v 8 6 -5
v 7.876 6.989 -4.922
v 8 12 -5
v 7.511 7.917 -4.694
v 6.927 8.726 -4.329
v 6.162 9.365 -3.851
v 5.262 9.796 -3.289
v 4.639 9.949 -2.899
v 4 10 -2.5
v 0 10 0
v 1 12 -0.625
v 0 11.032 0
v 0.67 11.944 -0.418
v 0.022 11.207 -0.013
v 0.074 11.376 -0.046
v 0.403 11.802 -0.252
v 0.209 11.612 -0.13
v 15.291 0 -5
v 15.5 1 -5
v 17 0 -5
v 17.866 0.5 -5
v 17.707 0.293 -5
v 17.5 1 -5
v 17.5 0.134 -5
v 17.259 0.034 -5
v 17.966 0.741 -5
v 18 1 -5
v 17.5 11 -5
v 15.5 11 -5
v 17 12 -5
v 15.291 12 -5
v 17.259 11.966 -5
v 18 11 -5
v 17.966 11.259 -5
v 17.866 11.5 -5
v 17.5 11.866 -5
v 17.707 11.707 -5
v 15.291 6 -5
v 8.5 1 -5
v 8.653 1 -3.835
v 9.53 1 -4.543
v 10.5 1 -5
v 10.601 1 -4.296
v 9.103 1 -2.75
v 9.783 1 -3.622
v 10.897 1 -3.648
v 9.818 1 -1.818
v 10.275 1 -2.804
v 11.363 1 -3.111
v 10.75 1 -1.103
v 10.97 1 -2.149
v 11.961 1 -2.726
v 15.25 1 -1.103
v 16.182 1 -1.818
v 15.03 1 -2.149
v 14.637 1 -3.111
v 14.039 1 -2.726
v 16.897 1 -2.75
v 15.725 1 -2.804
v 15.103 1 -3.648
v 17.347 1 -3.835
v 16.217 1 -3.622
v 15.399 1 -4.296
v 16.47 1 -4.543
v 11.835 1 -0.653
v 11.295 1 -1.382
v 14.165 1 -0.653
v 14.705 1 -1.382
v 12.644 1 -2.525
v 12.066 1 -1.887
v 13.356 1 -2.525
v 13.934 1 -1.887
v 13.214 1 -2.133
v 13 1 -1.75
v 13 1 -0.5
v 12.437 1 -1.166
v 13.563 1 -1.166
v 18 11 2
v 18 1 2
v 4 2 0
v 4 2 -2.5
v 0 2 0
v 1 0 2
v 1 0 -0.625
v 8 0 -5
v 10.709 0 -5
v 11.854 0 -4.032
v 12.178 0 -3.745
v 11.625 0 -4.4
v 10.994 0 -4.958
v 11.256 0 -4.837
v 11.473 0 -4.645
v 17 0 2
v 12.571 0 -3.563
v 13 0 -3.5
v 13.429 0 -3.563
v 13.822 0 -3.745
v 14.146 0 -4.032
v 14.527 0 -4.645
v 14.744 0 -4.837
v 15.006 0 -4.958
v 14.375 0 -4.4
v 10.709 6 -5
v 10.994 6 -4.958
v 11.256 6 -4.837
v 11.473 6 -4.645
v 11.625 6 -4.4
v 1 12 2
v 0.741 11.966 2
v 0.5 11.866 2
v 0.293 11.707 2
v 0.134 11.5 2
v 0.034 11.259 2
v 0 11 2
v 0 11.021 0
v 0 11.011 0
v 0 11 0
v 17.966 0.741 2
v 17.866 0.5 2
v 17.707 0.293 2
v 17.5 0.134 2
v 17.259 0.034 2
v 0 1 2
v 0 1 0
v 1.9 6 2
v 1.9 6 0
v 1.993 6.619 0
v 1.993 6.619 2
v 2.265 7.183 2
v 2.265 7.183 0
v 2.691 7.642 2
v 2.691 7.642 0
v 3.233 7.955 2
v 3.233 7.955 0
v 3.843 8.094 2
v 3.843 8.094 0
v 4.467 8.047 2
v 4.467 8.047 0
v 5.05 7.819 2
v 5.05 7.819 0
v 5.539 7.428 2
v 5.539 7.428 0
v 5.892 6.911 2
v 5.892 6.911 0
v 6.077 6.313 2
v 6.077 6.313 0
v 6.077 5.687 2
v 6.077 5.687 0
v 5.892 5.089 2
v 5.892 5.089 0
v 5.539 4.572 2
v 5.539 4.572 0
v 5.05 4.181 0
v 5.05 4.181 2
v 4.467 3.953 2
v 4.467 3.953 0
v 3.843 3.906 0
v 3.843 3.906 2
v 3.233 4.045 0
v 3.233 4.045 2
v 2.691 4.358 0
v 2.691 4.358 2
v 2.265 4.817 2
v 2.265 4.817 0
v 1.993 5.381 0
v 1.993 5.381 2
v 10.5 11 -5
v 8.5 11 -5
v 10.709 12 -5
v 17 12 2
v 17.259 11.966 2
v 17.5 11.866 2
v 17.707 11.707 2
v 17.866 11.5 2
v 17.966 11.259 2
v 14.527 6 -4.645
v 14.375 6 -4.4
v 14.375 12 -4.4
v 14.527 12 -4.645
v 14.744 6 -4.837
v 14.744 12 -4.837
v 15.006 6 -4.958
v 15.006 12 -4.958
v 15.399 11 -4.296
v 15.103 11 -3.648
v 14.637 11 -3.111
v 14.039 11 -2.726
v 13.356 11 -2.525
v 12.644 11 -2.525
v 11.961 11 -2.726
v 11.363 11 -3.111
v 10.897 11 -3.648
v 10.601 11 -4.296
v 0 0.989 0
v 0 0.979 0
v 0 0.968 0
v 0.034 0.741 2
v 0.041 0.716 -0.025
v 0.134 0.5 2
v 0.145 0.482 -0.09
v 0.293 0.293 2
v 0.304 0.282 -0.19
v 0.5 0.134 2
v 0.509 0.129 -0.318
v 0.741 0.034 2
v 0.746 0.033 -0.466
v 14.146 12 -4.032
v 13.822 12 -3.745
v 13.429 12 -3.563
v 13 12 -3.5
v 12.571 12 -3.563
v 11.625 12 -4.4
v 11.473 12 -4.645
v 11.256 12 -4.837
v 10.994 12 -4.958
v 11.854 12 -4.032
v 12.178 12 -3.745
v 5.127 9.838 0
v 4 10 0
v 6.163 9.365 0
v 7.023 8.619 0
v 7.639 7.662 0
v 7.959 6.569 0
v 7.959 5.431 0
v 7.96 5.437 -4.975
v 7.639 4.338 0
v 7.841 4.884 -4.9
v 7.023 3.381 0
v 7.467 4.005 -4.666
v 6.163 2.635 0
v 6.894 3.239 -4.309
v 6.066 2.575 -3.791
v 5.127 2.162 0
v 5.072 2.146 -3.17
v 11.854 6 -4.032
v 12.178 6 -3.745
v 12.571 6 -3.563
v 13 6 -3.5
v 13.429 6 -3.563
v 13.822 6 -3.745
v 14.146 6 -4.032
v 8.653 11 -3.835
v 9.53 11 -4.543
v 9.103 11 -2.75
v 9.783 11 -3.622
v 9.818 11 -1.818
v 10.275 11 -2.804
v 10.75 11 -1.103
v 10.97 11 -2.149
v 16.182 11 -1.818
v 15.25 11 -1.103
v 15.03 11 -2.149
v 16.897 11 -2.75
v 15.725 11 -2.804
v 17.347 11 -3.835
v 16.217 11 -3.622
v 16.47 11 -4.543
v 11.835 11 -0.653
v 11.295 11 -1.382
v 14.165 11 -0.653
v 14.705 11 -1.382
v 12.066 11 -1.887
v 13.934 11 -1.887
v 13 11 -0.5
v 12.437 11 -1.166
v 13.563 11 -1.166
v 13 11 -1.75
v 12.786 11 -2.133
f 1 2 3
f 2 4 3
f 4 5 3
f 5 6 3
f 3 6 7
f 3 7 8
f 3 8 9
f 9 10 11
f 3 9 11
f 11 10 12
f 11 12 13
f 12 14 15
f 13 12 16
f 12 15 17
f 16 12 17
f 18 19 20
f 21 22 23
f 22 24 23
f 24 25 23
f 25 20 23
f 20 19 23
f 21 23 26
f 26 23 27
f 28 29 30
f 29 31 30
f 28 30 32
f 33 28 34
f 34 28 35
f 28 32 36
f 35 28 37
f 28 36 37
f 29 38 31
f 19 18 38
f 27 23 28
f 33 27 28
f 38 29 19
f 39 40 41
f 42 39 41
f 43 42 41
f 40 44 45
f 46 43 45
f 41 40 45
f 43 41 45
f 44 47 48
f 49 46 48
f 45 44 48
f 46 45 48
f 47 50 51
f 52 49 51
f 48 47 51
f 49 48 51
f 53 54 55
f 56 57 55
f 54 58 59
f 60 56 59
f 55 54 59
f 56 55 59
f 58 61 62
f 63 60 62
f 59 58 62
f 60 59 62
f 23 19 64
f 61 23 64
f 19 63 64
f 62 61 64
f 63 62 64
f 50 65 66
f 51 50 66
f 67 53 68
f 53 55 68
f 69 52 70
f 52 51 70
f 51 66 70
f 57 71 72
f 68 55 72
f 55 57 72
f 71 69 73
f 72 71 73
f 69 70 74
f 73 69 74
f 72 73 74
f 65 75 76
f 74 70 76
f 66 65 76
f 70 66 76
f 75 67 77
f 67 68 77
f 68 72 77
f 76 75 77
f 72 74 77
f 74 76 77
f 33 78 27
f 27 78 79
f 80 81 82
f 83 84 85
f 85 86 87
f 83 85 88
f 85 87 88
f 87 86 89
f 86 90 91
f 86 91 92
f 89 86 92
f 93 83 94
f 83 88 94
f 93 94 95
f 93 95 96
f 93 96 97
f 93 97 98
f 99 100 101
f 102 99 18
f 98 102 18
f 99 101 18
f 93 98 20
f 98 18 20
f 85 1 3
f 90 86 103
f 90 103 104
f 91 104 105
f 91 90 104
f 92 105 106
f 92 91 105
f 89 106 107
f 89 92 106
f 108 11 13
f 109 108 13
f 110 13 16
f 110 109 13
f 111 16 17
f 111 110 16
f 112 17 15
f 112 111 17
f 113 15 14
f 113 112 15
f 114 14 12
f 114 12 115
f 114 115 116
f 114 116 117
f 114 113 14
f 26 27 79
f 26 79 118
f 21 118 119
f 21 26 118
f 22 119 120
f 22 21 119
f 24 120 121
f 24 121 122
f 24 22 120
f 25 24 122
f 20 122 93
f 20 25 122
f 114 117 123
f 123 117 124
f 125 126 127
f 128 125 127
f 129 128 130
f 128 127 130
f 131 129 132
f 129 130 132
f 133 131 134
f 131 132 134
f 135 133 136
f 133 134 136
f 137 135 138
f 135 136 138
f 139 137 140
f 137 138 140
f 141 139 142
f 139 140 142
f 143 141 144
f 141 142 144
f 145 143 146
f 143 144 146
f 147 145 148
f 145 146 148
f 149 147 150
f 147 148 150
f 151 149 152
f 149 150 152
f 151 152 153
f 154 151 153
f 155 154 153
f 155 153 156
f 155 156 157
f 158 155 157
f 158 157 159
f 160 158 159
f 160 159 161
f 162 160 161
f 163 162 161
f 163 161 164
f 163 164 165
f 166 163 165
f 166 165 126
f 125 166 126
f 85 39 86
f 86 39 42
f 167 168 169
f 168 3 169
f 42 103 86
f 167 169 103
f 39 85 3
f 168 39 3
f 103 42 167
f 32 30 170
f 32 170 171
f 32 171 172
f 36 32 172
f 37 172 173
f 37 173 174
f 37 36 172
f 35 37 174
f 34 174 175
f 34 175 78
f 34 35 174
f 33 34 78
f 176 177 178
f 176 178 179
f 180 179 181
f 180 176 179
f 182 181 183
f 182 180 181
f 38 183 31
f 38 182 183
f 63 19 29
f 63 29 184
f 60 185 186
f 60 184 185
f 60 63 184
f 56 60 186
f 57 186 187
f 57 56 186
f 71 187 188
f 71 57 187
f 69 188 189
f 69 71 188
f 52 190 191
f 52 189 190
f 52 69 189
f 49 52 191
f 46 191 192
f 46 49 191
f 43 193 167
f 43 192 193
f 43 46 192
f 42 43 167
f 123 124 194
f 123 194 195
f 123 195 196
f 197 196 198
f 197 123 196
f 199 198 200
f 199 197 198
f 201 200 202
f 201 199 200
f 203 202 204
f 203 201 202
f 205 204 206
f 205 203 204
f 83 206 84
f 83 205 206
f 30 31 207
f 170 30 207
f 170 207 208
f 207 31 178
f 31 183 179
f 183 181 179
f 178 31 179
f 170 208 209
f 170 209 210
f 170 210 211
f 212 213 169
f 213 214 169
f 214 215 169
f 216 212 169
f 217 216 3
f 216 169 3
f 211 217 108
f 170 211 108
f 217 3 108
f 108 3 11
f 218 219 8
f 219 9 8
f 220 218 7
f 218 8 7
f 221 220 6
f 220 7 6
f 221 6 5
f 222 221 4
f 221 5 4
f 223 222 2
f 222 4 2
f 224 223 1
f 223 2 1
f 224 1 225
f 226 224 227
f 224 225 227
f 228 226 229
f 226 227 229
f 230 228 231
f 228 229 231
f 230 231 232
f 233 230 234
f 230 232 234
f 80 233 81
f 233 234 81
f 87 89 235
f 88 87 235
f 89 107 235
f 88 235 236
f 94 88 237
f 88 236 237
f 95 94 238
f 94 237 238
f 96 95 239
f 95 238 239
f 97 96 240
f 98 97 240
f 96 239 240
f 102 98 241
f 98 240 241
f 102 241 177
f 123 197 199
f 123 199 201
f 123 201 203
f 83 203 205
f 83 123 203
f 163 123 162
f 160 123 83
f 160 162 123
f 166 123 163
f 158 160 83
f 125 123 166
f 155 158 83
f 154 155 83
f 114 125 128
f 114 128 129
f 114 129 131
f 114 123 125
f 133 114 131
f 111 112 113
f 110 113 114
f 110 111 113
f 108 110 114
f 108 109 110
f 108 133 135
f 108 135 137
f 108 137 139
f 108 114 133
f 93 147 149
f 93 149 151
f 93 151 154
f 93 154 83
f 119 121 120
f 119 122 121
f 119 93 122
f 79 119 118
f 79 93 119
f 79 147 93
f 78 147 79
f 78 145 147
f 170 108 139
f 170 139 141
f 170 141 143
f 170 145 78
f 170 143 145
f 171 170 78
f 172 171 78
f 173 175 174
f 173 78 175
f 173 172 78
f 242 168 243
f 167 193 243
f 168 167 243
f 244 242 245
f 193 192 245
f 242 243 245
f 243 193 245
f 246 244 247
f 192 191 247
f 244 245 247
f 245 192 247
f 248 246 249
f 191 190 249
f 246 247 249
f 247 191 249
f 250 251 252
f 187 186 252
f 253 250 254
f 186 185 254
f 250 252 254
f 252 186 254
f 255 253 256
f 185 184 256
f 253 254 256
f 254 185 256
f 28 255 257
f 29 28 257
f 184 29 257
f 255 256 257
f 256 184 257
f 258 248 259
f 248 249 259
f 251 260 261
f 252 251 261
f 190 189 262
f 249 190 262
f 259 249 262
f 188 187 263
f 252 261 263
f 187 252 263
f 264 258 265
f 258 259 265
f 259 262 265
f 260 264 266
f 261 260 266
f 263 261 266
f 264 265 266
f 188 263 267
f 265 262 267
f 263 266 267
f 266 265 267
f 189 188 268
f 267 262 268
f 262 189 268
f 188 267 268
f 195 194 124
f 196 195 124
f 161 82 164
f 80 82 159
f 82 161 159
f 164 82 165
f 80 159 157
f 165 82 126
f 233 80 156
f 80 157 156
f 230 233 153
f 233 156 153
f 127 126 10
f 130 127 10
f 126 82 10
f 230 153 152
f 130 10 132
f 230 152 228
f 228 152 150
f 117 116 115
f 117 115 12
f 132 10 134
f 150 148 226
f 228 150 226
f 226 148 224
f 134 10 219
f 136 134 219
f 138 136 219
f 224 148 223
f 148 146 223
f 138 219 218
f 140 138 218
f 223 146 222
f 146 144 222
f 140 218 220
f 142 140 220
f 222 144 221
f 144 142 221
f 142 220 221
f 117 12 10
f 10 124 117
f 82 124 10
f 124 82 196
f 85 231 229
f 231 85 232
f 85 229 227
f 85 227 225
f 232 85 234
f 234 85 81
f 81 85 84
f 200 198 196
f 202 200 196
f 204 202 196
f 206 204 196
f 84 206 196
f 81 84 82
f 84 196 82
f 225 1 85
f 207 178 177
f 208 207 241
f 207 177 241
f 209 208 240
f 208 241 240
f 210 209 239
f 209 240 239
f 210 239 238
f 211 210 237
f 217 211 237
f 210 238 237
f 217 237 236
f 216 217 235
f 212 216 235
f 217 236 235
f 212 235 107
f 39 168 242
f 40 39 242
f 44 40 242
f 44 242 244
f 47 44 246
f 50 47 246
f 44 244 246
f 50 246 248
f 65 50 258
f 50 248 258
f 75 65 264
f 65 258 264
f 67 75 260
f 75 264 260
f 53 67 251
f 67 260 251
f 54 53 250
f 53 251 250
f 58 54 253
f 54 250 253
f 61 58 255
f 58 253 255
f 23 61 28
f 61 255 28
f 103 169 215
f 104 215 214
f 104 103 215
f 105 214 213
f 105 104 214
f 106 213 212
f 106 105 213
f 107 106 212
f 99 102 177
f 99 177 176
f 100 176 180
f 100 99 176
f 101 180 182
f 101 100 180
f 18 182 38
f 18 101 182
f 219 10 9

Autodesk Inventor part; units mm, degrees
ref_plane "YZ Plane" through (0, 0, 0) normal (1, 0, 0) x (0, 1, 0)
ref_plane "XZ Plane" through (0, 0, 0) normal (0, 1, 0) x (-1, 0, 0)
sketch "Esquisse1" plane through (0, 0, 0) normal (0, 0, 1) x (1, 0, 0)
  line L0 (0, 0) -> (8, 0)
  line L1 (8, 0) -> (8, 12)
  line L2 (8, 12) -> (0, 12)
  line L3 (0, 12) -> (0, 0)
  dimension "d0" = 8
  dimension "d1" = 12
extrude "Extrusion1" add sketch "Esquisse1" along normal blind 2
sketch "Esquisse2" plane through (0, 0, 2) normal (0, 0, 1) x (1, 0, 0)
  line L0 (8, 0) -> (8, 12) projected
  line L1 (8, 12) -> (18, 12)
  line L2 (18, 12) -> (18, 0)
  line L3 (18, 0) -> (8, 0)
  line L4 (8, 0) -> (8, 12)
  point P0 (0, 0)
  dimension "d7" = 10
extrude "Extrusion2" add sketch "Esquisse2" against normal blind 7
chamfer "Chanfrein1" distance 5 distance2 8 1 edges at (8, 6, 0) measured on face at (8, 4, -1.6667)
sketch "Esquisse3" plane through (0, 0, -5) normal (0, 0, -1) x (-1, 0, 0)
  arc A0 (-4, 10) -> (-4, 2) centre (-4, 6) ccw
  line L0 (-8, 0) -> (-8, 12) projected
  line L1 (-4, 2) -> (4, 2)
  line L2 (4, 2) -> (4, 10)
  line L3 (4, 10) -> (-4, 10)
  point P0 (0, 0)
  dimension "d13" = 8
extrude "Extrusion3" cut sketch "Esquisse3" against normal blind 5
sketch "Esquisse4" plane through (0, 0, 0) normal (0, 0, -1) x (-1, 0, 0)
  arc A0 (-4, 10) -> (-8, 6) centre (-4, 6) ccw projected
  circle A1 centre (-4, 6) radius 2.1
  point P0 (0, 0)
  dimension "d16" = 4.2
extrude "Extrusion4" cut sketch "Esquisse4" against normal through all
ref_plane "Plan de construction2" through (0, 6, 2) normal (0, 1, 0) x (1, 0, 0)
sketch "Esquisse10" plane through (0, 6, 2) normal (0, 1, 0) x (1, 0, 0)
  line L0 (18, 7) -> (8, 7) projected
  circle A0 centre (13, 7) radius 3.5
  point P0 (0, 2)
  dimension "d29" = 7
sketch "Esquisse12" plane through (0, 0, -5) normal (0, 0, -1) x (-1, 0, 0)
  line L0 (-9.5, 6) -> (-16.5, 6) projected
  line L1 (-8.5, 11) -> (-10.5, 11)
  line L2 (-10.5, 11) -> (-10.5, 1)
  line L3 (-10.5, 1) -> (-8.5, 1)
  line L4 (-8.5, 1) -> (-8.5, 11)
  line L5 (-8.5, 11) -> (-10.5, 1) construction
  line L6 (-10.5, 11) -> (-8.5, 1) construction
  point P0 (0, 0)
  dimension "d30" = 2
sweep "Balayage2" cut profiles "Esquisse12" path "Esquisse10" path curves A0
sketch "Esquisse13" plane through (0, 6, 2) normal (0, 1, 0) x (1, 0, 0)
  line L0 (8, 7) -> (18, 7) projected
  circle A0 centre (13, 7) radius 1.5
  point P0 (0, 2)
  dimension "d33" = 3
extrude "Extrusion6" cut sketch "Esquisse13" along normal through all both and the other way through all
fillet "Congé3" radius 1 4 edges at (14.5, 3, -5) (14.5, 9, -5) (11.5, 9, -5) (11.5, 3, -5)
fillet "Congé4" radius 1 4 edges at (18, 12, -1.5) (18, 0, -1.5) (0, 0, 1) (0, 12, 1)
properties part number "passe cable"
